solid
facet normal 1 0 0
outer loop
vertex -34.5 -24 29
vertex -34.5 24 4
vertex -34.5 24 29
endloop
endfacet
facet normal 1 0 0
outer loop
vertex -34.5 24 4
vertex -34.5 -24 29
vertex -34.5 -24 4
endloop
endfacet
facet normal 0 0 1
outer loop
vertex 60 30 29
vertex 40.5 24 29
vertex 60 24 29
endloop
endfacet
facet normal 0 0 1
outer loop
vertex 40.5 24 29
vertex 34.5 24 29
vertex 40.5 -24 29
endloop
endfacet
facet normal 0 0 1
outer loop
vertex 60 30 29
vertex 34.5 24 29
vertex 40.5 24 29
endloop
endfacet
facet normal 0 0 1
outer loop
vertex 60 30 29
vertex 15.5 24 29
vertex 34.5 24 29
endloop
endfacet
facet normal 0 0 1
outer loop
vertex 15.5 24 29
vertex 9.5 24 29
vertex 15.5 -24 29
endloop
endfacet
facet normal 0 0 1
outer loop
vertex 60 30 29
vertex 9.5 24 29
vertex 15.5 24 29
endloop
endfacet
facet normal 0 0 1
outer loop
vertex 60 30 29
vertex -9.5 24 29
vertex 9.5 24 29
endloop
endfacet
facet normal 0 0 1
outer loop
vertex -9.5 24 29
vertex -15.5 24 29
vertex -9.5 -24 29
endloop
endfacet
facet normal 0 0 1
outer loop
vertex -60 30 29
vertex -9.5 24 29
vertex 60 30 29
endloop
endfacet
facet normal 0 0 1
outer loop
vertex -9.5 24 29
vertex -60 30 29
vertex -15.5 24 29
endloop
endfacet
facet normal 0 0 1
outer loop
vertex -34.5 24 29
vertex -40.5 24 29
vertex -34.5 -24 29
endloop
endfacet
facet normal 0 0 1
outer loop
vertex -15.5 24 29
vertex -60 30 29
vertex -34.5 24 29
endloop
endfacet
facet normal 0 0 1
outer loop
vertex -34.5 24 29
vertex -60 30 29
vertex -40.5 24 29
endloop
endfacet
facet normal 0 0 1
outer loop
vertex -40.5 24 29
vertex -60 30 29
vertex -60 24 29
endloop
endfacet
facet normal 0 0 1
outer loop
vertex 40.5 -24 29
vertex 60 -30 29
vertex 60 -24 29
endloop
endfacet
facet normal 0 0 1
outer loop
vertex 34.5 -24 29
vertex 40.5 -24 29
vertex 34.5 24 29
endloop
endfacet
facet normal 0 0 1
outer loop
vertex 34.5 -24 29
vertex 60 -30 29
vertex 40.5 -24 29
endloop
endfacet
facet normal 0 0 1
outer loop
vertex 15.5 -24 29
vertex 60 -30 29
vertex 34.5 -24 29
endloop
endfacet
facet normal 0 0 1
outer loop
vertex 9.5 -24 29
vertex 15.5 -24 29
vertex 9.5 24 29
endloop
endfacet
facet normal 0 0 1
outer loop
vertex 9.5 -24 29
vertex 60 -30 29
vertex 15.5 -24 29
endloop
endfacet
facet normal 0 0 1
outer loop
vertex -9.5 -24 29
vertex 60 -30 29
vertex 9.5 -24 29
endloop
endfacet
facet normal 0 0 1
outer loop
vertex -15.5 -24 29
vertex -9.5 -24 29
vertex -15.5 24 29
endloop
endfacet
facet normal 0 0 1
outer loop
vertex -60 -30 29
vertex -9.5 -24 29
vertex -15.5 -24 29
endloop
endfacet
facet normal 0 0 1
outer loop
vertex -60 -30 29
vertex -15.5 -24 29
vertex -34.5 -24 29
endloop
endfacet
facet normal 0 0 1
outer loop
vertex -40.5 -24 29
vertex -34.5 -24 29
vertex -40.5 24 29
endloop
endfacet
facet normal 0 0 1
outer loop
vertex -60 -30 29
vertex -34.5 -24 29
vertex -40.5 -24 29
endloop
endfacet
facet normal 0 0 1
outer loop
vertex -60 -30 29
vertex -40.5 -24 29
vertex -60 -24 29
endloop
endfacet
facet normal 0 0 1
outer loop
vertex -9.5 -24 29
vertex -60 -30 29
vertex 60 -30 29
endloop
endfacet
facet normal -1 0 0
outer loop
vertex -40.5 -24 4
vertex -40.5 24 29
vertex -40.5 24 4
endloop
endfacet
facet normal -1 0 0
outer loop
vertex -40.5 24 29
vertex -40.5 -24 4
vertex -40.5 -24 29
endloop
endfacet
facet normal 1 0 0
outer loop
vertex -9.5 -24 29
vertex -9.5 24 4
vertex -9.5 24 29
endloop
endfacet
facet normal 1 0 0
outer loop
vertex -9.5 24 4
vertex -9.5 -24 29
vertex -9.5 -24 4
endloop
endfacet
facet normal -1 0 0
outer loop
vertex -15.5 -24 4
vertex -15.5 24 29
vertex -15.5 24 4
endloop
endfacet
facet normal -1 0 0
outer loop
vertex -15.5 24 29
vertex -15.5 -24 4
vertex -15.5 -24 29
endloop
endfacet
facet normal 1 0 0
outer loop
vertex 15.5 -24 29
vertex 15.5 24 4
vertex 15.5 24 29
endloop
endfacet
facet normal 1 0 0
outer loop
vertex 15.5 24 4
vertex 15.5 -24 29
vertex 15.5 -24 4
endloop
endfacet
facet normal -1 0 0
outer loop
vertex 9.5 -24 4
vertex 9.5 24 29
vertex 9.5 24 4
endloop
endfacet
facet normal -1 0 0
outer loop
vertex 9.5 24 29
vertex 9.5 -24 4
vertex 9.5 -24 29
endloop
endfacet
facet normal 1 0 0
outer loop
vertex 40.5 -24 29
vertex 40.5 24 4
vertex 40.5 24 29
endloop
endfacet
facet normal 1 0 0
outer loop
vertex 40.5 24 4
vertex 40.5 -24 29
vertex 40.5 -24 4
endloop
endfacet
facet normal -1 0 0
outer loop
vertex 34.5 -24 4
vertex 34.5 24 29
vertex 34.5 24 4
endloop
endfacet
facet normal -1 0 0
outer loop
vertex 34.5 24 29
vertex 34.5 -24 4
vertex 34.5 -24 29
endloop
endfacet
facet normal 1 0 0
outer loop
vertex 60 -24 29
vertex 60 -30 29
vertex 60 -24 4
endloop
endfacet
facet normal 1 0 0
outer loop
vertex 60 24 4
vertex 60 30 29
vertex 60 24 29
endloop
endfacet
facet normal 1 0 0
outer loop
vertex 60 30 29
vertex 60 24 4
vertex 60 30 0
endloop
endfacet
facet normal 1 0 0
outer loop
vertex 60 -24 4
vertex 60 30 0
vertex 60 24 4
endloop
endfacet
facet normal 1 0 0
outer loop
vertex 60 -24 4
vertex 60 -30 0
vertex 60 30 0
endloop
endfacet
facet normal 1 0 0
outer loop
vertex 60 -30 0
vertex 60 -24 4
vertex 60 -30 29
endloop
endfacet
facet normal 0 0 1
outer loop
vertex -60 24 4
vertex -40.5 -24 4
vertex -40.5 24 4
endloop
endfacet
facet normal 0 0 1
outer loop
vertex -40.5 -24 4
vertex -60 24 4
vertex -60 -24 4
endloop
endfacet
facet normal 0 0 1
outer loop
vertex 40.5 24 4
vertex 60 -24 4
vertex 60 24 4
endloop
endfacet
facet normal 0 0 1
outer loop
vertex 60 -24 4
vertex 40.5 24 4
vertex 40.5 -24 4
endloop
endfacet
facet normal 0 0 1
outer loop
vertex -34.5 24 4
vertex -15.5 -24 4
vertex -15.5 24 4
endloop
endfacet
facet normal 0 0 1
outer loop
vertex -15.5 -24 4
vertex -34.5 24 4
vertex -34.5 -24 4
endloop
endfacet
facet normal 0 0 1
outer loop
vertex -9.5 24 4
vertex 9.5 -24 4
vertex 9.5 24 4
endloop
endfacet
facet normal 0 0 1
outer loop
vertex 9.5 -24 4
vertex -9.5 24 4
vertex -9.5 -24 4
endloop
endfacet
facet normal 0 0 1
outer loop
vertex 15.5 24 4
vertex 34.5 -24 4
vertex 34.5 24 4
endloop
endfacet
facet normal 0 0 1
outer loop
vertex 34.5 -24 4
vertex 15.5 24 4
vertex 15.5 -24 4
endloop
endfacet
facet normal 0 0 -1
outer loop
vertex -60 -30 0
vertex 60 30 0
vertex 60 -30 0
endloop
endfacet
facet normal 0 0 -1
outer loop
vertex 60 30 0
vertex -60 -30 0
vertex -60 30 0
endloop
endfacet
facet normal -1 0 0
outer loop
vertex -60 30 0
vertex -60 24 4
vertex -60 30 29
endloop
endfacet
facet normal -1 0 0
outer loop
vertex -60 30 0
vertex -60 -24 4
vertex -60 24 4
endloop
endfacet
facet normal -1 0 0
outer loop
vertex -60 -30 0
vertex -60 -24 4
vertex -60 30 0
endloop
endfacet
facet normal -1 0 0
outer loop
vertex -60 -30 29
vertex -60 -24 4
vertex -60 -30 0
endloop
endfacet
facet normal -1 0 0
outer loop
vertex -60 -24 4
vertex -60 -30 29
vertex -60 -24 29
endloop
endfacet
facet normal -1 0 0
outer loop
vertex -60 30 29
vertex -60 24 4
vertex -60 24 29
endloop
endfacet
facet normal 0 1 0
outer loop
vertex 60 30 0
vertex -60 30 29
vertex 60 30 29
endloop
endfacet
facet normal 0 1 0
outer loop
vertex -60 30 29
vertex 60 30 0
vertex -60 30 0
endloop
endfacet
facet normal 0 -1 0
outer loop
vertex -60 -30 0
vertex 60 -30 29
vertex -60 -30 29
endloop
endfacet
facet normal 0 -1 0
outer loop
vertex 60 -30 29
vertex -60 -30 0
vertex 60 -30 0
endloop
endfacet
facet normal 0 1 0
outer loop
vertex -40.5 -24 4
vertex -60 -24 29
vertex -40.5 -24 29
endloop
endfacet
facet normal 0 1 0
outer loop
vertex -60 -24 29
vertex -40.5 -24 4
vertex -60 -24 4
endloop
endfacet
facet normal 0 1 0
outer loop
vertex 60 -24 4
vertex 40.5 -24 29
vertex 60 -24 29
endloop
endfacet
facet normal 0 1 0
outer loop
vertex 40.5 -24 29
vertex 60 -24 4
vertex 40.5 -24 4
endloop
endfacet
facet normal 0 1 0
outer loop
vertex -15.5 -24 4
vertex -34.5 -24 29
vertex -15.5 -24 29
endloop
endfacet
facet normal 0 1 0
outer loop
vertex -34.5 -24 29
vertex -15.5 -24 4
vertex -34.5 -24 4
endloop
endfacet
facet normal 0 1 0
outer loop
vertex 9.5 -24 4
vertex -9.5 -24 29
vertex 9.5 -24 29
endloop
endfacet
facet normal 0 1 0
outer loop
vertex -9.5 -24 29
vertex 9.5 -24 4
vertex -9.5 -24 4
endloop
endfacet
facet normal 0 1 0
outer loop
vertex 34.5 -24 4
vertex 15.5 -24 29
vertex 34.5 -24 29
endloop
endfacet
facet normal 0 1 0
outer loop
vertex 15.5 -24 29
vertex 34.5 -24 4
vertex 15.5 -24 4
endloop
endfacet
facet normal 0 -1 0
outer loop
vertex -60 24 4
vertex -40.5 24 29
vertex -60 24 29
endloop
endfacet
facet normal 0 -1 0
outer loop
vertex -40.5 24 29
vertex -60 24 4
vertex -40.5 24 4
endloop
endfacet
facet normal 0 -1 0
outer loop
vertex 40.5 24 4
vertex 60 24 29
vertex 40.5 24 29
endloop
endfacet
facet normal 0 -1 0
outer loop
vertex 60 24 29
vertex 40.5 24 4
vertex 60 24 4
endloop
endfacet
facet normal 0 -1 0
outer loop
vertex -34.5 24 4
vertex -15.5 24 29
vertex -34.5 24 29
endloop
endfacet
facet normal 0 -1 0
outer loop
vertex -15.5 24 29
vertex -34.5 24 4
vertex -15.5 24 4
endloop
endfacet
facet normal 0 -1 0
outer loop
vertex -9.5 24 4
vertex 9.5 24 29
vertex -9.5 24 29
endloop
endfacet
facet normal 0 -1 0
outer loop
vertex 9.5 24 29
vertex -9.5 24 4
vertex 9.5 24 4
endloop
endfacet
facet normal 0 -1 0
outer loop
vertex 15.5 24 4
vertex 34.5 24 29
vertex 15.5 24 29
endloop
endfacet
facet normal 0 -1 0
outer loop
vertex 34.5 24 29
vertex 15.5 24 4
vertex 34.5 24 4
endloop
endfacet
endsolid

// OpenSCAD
$fn = 32;

// ----------------------------------------------------------------------
// Rib frame 120 x 60 x 29
// 4 ribs at 25 mm pitch
// ----------------------------------------------------------------------

// --- parameters (mm) ---
frame = [120, 60, 4];  // base plate size (x, y, z)
rail_w = 6;            // side rail width
ribs = 4;              // number of ribs
rib_t = 6;             // rib thickness
rib_h = 25;            // rib height above the base plate
pitch = 25;            // pitch between rib centres

// --- derived feature positions (mm) ---
span = (ribs - 1) * pitch;          // = 75   distance between the outer ribs
origin_x = -span / 2;               // = -37.5   X of the first rib
rib_len = frame[1] - 2 * rail_w + 2;  // = 50   rib length, 1 mm into each rail
feature_centers = [
  [origin_x + 0 * pitch, 0],
  [origin_x + 1 * pitch, 0],
  [origin_x + 2 * pitch, 0],
  [origin_x + 3 * pitch, 0]
];   // rib centre line, drives the rib loop

// base plate, two side rails, then the ribs read straight off feature_centers
union() {
  translate([-frame[0] / 2, -frame[1] / 2, 0]) cube(frame);
  translate([-frame[0] / 2, -frame[1] / 2, 0]) cube([frame[0], rail_w, frame[2] + rib_h]);
  translate([-frame[0] / 2, frame[1] / 2 - rail_w, 0]) cube([frame[0], rail_w, frame[2] + rib_h]);
  for (centre = feature_centers)
    translate([centre[0] - rib_t / 2, centre[1] - rib_len / 2, frame[2] - 1])
      cube([rib_t, rib_len, rib_h + 1]);
}
